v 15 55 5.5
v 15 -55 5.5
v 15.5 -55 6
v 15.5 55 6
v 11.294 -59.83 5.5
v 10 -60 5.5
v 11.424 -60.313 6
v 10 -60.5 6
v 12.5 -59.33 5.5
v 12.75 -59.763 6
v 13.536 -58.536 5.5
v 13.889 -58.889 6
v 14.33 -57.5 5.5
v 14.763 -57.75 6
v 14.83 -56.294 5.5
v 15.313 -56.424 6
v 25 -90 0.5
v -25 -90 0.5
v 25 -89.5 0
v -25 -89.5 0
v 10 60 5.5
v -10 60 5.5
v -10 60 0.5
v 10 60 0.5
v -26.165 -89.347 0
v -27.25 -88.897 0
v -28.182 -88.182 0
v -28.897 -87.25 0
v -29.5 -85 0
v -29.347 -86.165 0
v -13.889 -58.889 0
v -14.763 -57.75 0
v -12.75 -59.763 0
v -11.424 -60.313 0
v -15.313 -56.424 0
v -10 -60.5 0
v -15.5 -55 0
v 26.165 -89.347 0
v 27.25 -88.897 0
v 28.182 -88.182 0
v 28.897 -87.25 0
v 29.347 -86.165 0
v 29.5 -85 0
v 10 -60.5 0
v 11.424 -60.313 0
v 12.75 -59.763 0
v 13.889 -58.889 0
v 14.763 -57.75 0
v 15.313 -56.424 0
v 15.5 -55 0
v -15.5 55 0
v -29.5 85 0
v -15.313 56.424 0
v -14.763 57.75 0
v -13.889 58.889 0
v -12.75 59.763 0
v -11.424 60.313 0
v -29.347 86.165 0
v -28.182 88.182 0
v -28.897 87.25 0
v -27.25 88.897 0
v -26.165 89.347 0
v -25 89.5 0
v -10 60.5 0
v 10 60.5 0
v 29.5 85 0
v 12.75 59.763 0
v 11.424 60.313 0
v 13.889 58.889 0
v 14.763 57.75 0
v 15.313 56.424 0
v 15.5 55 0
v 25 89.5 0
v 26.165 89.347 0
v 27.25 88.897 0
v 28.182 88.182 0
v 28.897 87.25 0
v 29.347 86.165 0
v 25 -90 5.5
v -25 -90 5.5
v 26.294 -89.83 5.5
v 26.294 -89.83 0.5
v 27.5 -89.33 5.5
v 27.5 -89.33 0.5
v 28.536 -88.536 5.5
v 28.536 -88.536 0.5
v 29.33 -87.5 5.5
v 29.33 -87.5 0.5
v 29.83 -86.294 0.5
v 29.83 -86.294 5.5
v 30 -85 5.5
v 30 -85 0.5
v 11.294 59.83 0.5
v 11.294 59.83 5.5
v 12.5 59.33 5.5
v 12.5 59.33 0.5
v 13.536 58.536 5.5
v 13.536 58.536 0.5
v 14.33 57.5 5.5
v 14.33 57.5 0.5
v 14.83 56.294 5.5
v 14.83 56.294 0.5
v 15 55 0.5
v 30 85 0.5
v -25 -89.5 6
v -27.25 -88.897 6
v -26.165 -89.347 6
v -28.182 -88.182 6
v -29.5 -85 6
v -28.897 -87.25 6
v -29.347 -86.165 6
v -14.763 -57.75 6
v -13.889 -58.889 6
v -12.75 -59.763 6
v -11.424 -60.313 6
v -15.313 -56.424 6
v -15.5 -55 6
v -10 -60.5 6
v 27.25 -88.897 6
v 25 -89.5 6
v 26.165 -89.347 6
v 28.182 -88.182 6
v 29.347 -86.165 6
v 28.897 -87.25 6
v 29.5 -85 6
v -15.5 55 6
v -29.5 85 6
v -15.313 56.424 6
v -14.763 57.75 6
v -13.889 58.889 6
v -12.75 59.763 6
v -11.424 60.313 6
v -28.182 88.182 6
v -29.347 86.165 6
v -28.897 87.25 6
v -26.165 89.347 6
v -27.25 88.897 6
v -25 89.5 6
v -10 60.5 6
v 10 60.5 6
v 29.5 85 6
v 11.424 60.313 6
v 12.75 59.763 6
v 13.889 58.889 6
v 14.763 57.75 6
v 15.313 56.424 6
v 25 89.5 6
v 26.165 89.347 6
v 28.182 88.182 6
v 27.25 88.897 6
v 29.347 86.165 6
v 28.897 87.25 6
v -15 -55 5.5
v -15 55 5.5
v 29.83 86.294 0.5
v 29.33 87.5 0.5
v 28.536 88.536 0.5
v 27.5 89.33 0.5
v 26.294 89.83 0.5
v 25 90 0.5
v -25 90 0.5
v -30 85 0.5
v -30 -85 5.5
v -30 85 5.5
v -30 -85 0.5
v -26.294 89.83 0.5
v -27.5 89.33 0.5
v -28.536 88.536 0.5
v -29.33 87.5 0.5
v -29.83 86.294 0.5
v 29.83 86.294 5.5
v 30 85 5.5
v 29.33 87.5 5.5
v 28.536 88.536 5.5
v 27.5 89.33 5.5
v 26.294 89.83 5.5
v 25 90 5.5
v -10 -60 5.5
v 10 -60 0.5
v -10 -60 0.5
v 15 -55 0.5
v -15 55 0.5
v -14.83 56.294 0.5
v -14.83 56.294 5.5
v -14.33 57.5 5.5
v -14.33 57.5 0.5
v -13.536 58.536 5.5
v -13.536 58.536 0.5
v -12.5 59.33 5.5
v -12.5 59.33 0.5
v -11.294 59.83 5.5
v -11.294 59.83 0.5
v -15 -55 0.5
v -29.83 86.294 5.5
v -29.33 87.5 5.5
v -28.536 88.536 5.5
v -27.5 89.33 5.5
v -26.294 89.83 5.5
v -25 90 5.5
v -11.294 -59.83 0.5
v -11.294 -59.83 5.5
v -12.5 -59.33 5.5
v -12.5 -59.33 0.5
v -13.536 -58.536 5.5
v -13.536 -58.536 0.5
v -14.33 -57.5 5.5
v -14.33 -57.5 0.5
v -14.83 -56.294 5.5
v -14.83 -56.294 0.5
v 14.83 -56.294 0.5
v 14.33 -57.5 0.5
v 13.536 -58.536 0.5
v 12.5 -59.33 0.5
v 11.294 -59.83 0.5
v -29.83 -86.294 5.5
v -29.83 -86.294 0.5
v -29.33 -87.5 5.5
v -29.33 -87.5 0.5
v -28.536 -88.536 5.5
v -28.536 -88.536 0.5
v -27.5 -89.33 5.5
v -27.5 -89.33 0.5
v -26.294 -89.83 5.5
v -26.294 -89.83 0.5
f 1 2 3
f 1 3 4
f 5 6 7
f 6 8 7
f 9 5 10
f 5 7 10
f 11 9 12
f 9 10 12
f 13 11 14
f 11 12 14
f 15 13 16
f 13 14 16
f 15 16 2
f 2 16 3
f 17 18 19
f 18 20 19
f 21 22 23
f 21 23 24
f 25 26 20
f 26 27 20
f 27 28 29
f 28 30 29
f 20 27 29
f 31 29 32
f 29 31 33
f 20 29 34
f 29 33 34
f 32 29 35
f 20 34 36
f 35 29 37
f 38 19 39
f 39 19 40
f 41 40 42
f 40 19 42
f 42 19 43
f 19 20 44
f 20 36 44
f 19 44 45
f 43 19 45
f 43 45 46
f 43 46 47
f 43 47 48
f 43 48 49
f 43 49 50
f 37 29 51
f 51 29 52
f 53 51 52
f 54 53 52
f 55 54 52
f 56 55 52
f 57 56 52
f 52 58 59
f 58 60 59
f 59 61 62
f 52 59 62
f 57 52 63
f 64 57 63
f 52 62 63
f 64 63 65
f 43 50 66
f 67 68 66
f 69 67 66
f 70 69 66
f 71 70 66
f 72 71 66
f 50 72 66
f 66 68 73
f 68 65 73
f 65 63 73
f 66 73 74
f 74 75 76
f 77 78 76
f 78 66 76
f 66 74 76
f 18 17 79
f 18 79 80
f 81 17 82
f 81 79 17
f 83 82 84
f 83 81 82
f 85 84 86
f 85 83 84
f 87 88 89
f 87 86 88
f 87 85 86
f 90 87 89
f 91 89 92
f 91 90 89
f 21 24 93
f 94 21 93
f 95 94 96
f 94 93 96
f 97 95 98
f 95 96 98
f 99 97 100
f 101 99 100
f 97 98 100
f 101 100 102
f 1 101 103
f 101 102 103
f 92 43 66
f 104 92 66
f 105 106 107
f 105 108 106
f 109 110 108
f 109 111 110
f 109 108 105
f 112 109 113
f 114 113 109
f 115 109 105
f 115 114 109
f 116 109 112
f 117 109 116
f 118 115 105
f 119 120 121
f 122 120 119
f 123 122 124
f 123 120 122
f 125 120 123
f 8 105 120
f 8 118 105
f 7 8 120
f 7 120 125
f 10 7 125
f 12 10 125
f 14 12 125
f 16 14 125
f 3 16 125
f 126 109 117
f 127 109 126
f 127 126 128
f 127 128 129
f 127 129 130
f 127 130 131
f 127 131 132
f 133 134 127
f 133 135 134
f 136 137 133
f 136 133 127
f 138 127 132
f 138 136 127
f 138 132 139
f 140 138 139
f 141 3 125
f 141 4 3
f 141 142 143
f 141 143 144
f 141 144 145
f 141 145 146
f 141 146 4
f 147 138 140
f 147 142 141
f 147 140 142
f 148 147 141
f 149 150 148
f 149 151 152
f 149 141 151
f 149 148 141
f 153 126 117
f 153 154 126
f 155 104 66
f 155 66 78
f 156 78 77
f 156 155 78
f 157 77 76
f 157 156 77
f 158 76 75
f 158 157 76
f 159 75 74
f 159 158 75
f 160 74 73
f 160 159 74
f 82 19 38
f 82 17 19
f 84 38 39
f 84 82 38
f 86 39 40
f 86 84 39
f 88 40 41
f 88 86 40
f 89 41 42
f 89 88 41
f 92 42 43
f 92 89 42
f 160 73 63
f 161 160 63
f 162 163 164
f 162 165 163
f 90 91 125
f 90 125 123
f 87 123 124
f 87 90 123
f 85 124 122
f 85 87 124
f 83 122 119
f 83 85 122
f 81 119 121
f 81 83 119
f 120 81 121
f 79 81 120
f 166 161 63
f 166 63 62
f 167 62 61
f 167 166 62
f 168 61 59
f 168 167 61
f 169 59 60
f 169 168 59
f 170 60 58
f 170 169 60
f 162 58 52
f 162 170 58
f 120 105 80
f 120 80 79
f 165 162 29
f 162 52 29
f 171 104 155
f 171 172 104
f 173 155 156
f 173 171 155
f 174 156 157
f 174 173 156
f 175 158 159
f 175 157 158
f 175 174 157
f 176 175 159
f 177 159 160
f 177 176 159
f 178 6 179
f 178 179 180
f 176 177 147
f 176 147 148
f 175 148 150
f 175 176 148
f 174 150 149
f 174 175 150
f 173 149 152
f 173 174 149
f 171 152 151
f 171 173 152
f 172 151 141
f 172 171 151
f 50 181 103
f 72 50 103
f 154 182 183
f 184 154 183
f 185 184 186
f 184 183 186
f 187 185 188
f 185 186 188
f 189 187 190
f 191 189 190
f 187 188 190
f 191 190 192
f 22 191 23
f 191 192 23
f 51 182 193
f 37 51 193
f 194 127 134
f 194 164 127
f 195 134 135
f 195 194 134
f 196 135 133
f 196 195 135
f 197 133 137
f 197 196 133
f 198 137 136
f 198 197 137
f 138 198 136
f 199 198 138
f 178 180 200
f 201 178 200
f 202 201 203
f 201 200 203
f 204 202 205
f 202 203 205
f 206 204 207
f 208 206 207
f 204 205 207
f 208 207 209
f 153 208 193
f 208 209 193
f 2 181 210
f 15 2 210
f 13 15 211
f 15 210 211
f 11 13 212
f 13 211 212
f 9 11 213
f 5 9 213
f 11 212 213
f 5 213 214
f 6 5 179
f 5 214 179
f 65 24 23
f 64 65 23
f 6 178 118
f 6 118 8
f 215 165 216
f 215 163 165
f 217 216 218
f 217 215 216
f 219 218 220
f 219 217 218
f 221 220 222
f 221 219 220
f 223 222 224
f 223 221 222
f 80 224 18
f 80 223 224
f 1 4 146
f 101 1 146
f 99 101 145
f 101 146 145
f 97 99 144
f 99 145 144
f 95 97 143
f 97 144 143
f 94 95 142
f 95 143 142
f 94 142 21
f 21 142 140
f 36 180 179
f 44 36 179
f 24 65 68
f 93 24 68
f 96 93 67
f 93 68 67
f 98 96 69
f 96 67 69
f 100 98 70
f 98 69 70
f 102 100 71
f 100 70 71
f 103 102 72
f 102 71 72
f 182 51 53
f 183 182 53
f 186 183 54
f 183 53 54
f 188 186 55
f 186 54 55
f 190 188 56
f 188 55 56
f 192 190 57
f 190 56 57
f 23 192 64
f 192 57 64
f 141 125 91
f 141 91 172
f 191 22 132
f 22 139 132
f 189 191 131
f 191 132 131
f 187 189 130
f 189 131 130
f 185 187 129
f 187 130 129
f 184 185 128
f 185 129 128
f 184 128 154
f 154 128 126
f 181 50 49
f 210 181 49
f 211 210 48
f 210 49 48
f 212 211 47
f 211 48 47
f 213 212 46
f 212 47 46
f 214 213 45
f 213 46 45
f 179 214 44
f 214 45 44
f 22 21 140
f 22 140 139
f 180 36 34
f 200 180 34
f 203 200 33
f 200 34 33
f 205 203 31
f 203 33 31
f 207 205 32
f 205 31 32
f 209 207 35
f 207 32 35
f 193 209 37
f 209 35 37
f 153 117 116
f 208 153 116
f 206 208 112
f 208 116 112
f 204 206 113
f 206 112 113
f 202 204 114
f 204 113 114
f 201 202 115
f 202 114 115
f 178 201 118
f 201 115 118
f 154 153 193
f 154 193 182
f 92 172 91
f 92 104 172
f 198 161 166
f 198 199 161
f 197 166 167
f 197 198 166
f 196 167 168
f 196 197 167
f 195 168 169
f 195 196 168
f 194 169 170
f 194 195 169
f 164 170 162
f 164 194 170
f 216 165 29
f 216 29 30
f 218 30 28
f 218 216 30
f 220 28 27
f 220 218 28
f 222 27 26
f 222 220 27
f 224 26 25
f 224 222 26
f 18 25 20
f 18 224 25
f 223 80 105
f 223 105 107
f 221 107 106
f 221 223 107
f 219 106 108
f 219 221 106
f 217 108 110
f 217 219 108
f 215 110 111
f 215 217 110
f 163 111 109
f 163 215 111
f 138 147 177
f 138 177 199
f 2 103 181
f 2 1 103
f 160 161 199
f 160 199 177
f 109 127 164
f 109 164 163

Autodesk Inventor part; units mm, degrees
ref_plane "YZ Plane" through (0, 0, 0) normal (1, 0, 0) x (0, 1, 0)
ref_plane "XZ Plane" through (0, 0, 0) normal (0, 1, 0) x (-1, 0, 0)
ref_plane "XY Plane" through (0, 0, 0) normal (0, 0, 1) x (1, 0, 0)
sketch "Sketch1" plane through (0, 0, 0) normal (0, 0, 1) x (1, 0, 0)
  line L0 (-30, 90) -> (30, 90)
  line L1 (30, 90) -> (30, -90)
  line L2 (30, -90) -> (-30, -90)
  line L3 (-30, -90) -> (-30, 90)
  point P0 (0, 0)
  point P1 (30, 0)
  point P2 (0, 90)
  dimension "d0" = 60
  dimension "d1" = 180
extrude "Extrusion1" add sketch "Sketch1" along normal blind 6
sketch "Sketch4" plane through (0, 0, 6) normal (0, 0, 1) x (1, 0, 0)
  line L0 (-15, 60) -> (15, 60)
  line L1 (15, 60) -> (15, -60)
  line L2 (15, -60) -> (-15, -60)
  line L3 (-15, -60) -> (-15, 60)
  line L4 (30, -90) -> (30, 90) projected
  line L5 (30, 90) -> (-30, 90) projected
  point P0 (0, 0)
  point P1 (0, 60)
  point P2 (15, 0)
  dimension "d20" = 15
  dimension "d21" = 30
extrude "Extrusion4" cut sketch "Sketch4" against normal through all
fillet "Fillet1" radius 5 8 edges at (-30, 90, 3) (30, 90, 3) (30, -90, 3) (-30, -90, 3) (-15, 60, 3) (15, 60, 3) (15, -60, 3) (-15, -60, 3)
chamfer "Chamfer2" distance 0.5 angle 45 32 edges at (0, 90, 6) (-28.5355, 88.5355, 6) (-30, 0, 6) (-28.5355, -88.5355, 6) (0, -90, 6) (28.5355, -88.5355, 6) (30, 0, 6) (28.5355, 88.5355, 6) (0, 90, 0) (-28.5355, 88.5355, 0) (-30, 0, 0) (-28.5355, -88.5355, 0) (0, -90, 0) (28.5355, -88.5355, 0) (30, 0, 0) (28.5355, 88.5355, 0) (-15, 0, 6) (-13.5355, 58.5355, 6) (0, 60, 6) (13.5355, 58.5355, 6) (15, 0, 6) (13.5355, -58.5355, 6) (0, -60, 6) (-13.5355, -58.5355, 6) (-15, 0, 0) (-13.5355, -58.5355, 0) (0, -60, 0) (13.5355, -58.5355, 0) (15, 0, 0) (13.5355, 58.5355, 0) (0, 60, 0) (-13.5355, 58.5355, 0)
equation "\"d0\" = width"
equation "\"d1\" = hight"
equation "\"hight\" = 180"
equation "\"width\" = 60"
properties part number "tc-top-bar" material "ABS Plastic"
